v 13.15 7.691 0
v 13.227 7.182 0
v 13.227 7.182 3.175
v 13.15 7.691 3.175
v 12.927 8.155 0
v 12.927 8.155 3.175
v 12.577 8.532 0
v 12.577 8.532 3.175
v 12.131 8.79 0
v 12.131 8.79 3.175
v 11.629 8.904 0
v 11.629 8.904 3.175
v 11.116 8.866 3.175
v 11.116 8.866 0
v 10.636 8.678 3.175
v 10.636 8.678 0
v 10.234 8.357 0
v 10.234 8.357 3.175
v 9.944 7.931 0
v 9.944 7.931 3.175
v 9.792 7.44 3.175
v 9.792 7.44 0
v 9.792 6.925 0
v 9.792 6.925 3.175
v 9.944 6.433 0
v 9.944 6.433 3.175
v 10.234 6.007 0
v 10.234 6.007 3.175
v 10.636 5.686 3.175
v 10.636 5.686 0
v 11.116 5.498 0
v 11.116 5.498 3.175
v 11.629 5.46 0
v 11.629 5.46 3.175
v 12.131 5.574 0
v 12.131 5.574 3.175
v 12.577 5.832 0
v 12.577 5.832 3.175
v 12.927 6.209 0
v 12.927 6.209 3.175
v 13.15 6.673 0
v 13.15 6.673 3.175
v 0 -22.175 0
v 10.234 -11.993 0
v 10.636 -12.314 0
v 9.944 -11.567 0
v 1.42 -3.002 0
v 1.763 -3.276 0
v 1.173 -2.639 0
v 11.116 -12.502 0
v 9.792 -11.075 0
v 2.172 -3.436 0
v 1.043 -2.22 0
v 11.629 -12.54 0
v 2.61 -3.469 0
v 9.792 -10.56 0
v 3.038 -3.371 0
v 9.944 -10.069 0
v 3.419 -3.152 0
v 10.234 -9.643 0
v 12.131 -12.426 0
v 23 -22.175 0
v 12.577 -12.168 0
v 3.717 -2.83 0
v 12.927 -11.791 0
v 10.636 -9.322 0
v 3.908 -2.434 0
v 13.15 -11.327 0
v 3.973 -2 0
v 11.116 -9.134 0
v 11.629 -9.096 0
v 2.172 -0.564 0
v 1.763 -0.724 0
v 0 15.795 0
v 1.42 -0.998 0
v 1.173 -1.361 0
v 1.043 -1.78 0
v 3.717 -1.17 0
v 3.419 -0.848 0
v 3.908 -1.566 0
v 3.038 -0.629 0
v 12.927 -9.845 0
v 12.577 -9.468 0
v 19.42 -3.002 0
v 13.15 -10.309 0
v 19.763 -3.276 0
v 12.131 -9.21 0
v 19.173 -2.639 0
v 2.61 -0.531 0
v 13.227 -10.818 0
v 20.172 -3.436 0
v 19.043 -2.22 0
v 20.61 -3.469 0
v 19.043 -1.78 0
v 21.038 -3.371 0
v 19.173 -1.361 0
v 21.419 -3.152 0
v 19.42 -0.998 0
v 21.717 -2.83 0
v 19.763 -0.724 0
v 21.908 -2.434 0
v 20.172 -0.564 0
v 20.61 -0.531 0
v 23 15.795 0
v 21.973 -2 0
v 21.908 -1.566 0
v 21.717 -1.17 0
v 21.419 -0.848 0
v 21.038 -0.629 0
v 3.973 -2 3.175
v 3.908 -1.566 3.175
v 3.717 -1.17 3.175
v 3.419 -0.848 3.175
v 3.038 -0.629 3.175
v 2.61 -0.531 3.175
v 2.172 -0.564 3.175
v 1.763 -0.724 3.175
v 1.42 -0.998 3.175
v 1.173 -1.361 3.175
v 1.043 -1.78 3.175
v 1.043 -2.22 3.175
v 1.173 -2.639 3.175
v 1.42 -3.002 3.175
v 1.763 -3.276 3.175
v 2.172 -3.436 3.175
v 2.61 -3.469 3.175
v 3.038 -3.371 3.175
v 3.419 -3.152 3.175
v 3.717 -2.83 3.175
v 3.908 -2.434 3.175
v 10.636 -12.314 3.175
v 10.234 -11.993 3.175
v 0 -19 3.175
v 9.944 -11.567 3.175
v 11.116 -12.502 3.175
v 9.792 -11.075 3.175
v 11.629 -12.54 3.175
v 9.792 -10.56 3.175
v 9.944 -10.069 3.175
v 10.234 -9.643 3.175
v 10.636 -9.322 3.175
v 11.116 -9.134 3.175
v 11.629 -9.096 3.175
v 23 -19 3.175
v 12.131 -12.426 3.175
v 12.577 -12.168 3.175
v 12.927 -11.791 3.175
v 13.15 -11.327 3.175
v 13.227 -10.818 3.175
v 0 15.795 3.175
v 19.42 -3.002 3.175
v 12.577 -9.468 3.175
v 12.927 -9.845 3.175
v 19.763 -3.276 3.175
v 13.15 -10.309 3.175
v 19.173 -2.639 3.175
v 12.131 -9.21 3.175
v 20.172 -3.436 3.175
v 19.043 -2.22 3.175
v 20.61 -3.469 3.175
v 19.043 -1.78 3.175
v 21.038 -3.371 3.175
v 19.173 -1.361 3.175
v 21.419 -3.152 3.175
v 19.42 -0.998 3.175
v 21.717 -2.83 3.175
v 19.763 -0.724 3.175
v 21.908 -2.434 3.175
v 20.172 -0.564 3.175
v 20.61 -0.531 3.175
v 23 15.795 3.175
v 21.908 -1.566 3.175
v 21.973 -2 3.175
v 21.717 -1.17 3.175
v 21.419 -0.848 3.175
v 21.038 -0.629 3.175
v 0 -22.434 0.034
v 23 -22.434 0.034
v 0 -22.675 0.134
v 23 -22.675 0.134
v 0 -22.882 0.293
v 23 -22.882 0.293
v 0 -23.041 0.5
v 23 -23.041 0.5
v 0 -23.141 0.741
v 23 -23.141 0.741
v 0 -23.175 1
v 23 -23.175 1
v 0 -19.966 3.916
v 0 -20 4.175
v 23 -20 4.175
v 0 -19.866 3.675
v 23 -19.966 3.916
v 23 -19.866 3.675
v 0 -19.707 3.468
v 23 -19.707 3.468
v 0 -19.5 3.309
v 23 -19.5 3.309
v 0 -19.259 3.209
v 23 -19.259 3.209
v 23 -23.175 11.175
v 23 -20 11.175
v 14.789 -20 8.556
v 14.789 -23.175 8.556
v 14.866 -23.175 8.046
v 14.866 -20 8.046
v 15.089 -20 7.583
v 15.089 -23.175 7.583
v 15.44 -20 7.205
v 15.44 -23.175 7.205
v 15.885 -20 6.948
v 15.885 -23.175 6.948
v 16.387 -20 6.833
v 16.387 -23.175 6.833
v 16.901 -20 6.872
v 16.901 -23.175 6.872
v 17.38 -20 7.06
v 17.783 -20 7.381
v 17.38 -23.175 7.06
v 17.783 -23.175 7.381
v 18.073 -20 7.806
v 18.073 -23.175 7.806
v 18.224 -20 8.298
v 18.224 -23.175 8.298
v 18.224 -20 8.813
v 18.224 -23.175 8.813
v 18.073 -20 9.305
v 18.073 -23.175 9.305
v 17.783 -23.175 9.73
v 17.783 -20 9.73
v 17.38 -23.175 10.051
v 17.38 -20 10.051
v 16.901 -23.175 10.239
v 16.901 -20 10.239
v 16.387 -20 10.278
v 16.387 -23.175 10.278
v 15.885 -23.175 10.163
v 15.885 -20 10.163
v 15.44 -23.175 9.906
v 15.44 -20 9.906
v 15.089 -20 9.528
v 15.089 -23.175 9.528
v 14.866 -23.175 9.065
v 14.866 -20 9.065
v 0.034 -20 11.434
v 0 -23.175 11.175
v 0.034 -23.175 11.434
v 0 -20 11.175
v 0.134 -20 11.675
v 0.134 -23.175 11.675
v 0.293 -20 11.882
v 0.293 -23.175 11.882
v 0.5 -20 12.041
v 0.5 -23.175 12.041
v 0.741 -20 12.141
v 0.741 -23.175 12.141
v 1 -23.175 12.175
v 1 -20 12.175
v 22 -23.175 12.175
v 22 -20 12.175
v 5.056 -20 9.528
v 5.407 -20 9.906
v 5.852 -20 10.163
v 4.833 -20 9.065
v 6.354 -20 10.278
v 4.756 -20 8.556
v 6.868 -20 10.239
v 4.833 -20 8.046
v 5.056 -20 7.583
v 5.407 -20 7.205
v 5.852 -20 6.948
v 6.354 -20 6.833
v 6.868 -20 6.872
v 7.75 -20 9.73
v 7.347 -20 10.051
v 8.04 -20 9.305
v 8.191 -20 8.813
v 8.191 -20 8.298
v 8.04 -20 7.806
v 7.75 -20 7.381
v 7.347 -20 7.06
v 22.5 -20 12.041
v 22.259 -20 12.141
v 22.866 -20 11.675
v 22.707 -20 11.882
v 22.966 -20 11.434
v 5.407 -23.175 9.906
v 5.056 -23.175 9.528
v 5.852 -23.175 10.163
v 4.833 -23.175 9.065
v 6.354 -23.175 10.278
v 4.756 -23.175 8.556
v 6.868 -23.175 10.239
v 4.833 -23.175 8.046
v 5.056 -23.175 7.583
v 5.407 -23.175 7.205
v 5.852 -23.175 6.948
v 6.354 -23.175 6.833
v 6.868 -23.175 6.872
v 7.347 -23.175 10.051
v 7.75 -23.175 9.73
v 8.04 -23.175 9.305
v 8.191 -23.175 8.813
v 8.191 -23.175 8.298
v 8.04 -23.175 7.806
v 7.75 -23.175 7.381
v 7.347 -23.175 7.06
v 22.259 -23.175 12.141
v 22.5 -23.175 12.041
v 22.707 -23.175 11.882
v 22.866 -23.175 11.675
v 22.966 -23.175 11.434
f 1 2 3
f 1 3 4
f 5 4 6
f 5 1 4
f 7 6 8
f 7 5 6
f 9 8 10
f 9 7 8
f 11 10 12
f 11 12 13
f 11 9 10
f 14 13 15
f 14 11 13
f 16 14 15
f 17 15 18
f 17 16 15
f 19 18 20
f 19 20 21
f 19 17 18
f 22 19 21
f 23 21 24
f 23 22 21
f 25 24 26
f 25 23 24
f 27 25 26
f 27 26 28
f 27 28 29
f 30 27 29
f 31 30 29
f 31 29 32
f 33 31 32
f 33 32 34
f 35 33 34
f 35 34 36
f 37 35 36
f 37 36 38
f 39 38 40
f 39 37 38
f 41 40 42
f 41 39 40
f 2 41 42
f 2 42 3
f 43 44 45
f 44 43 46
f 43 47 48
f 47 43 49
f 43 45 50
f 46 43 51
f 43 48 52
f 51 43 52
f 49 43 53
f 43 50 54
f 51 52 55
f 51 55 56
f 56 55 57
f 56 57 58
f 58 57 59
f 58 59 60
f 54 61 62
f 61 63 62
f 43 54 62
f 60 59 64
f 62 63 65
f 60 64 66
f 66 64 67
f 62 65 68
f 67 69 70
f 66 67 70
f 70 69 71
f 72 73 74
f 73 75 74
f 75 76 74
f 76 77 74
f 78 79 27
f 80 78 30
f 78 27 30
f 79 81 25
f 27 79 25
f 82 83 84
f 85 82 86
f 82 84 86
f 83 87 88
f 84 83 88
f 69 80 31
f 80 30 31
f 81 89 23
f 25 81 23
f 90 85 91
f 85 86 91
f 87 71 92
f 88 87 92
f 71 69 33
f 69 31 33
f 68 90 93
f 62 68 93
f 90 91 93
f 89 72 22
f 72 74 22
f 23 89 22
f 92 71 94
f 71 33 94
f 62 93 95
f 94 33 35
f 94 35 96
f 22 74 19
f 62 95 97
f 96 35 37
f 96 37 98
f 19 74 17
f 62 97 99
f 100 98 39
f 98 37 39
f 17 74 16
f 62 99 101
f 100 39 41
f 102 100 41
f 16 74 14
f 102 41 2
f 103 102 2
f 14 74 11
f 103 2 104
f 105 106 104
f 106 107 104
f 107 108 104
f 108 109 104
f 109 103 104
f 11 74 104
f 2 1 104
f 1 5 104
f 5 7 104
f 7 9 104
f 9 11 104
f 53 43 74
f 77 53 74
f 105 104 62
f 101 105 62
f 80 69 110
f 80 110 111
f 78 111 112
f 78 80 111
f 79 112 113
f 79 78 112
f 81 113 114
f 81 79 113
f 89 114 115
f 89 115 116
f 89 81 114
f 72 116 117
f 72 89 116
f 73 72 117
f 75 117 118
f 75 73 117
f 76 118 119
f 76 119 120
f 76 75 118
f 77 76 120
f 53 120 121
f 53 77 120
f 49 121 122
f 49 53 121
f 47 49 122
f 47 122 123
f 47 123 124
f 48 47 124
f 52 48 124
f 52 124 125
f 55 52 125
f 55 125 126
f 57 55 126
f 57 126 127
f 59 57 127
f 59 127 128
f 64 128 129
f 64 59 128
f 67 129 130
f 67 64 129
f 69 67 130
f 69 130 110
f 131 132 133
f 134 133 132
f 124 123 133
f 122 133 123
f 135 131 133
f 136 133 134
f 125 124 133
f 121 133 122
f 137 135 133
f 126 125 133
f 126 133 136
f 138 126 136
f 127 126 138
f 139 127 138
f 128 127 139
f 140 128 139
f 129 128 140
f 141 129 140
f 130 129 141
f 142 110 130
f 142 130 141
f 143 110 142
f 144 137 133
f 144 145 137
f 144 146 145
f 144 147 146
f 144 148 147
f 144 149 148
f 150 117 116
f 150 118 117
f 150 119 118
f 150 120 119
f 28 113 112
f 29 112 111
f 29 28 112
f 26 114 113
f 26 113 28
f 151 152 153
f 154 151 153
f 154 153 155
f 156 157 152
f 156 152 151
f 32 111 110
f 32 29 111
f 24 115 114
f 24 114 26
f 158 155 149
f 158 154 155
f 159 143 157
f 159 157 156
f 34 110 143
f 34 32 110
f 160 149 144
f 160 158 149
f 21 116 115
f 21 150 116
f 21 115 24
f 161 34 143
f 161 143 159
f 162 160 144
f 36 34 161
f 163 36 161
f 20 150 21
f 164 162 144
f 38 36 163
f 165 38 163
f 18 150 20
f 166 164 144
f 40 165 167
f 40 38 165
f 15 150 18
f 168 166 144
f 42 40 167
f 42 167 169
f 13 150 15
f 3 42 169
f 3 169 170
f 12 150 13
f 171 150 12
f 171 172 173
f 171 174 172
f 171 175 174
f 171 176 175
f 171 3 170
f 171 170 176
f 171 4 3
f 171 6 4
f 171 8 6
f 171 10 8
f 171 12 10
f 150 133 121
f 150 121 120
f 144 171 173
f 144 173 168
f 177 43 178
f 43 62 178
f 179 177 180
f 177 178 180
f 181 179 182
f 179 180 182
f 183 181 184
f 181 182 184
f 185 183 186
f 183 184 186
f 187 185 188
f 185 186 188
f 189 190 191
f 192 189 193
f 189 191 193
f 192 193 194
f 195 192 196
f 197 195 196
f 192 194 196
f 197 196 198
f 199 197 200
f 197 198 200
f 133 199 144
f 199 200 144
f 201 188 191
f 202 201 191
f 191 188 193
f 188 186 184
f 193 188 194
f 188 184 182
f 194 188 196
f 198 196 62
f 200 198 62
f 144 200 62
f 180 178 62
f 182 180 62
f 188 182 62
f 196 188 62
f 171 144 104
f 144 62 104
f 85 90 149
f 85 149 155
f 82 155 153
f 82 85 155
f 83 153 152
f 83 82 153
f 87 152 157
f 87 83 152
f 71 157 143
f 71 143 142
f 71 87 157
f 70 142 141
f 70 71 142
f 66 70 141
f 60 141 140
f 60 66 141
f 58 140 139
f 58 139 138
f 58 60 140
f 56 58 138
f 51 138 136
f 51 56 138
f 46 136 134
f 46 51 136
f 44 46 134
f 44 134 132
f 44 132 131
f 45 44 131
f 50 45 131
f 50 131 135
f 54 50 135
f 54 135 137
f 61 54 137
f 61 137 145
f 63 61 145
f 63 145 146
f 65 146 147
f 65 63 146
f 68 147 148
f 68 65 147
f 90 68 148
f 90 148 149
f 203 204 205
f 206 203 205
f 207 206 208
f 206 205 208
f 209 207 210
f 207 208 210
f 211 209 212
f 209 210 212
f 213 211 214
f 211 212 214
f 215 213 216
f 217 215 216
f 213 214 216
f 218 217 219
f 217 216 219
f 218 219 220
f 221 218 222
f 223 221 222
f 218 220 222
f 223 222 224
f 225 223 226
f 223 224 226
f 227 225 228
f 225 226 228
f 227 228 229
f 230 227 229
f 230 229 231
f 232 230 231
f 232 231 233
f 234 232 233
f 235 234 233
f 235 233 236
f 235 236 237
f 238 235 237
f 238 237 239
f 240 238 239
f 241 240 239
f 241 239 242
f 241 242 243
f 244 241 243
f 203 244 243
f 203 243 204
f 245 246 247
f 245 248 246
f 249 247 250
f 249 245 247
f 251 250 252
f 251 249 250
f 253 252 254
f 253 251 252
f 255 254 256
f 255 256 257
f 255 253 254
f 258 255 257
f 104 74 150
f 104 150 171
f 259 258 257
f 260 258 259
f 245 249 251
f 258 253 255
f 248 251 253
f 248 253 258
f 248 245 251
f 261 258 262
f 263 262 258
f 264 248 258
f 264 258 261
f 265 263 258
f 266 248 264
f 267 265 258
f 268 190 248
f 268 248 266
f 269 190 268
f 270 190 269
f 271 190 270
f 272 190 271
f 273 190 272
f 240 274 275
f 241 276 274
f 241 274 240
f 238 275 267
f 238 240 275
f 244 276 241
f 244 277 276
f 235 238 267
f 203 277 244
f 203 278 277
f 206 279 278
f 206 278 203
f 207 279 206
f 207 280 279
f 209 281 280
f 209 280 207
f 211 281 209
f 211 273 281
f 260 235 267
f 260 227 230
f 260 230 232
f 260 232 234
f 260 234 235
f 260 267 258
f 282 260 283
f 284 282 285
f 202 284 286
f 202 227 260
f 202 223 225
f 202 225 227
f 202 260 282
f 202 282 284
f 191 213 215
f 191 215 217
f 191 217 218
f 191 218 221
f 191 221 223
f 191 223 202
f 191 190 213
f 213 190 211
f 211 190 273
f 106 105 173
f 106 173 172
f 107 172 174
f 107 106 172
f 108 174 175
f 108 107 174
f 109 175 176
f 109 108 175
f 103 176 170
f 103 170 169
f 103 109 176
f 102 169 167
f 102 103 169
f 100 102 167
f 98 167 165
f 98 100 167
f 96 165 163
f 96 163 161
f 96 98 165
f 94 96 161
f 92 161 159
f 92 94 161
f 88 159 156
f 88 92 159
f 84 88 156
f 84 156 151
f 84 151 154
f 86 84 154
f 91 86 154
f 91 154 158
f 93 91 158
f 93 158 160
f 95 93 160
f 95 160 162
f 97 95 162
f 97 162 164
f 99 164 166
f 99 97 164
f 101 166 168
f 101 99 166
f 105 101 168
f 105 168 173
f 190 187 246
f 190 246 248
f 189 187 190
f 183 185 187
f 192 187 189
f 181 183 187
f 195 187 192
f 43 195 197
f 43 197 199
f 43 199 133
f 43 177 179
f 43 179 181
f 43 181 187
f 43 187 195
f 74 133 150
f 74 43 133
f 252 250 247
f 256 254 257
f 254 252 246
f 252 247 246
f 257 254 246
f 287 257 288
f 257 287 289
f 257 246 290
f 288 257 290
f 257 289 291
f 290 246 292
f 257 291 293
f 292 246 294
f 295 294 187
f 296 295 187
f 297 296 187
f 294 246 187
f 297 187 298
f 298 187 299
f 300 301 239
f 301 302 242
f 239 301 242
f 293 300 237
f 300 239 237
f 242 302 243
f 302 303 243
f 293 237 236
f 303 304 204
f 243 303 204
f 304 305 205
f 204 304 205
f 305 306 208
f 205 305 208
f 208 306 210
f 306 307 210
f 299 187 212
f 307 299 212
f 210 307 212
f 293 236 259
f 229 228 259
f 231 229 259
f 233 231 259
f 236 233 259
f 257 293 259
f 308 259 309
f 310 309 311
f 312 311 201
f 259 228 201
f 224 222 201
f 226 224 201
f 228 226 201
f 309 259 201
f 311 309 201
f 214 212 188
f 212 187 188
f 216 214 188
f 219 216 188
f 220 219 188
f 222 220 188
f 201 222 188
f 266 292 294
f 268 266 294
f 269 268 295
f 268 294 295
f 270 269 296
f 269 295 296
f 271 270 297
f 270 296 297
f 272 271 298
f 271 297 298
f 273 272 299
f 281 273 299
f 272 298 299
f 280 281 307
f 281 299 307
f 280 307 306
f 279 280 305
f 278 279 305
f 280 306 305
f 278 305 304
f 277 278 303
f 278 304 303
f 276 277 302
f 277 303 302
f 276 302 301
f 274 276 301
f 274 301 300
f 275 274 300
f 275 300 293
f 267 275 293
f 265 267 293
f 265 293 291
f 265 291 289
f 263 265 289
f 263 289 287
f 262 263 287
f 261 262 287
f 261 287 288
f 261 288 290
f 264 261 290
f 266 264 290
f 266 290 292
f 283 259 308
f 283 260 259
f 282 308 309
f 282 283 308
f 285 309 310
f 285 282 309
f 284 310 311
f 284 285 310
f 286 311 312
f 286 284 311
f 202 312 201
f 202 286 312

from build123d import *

# Parameters (mm, degrees)
SKETCH1_W             = 23
SKETCH1_H             = 38.970207686
SKETCH1_R             = 1.7272
SKETCH1_R_2           = 1.4732
BOSS_EXTRUDE1_DEPTH   = 3.175
BOSS_EXTRUDE2_START   = 3.175
SKETCH1_3_W           = 23
SKETCH1_3_H           = 3.175
BOSS_EXTRUDE2_DEPTH   = 9
F_8_32_TAPPED_HOLE1_D = 3.4544
FILLET1_R             = 1


with BuildPart() as part:
    # Sketch1 → Boss-Extrude1 (new body)
    with BuildSketch(Plane.XY):
        with Locations((11.5, -3.689896157)):
            Rectangle(SKETCH1_W, SKETCH1_H)
        with Locations((11.5, -10.81790431)):
            Circle(SKETCH1_R, mode=Mode.SUBTRACT)
        with Locations((2.5, -2)):
            Circle(SKETCH1_R_2, mode=Mode.SUBTRACT)
        with Locations((20.5, -2)):
            Circle(SKETCH1_R_2, mode=Mode.SUBTRACT)
        with Locations((11.5, 7.18209569)):
            Circle(SKETCH1_R, mode=Mode.SUBTRACT)
    extrude(amount=BOSS_EXTRUDE1_DEPTH)

    # Sketch1<3> → Boss-Extrude2 (add)
    with BuildSketch(Plane.XY.offset(BOSS_EXTRUDE2_START)):
        with Locations((11.5, -21.5875)):
            Rectangle(SKETCH1_3_W, SKETCH1_3_H)
    extrude(amount=BOSS_EXTRUDE2_DEPTH)

    # #8-32 Tapped Hole1 (through all)
    with Locations(Plane(origin=(6.4835, -20, 8.5555), x_dir=(1, 0, 0), z_dir=(0, 1, 0))):
        with Locations((0, 0), (10.033, 0)):
            Hole(F_8_32_TAPPED_HOLE1_D / 2)

    # Fillet1
    fillet1_edges = [part.edges().sort_by_distance(p)[0] for p in [
        (11.5, -23.175, 0),
        (0, -21.5875, 12.175),
        (11.5, -20, 3.175),
        (23, -21.5875, 12.175),
    ]]
    fillet(fillet1_edges, radius=FILLET1_R)


solid = part.part
